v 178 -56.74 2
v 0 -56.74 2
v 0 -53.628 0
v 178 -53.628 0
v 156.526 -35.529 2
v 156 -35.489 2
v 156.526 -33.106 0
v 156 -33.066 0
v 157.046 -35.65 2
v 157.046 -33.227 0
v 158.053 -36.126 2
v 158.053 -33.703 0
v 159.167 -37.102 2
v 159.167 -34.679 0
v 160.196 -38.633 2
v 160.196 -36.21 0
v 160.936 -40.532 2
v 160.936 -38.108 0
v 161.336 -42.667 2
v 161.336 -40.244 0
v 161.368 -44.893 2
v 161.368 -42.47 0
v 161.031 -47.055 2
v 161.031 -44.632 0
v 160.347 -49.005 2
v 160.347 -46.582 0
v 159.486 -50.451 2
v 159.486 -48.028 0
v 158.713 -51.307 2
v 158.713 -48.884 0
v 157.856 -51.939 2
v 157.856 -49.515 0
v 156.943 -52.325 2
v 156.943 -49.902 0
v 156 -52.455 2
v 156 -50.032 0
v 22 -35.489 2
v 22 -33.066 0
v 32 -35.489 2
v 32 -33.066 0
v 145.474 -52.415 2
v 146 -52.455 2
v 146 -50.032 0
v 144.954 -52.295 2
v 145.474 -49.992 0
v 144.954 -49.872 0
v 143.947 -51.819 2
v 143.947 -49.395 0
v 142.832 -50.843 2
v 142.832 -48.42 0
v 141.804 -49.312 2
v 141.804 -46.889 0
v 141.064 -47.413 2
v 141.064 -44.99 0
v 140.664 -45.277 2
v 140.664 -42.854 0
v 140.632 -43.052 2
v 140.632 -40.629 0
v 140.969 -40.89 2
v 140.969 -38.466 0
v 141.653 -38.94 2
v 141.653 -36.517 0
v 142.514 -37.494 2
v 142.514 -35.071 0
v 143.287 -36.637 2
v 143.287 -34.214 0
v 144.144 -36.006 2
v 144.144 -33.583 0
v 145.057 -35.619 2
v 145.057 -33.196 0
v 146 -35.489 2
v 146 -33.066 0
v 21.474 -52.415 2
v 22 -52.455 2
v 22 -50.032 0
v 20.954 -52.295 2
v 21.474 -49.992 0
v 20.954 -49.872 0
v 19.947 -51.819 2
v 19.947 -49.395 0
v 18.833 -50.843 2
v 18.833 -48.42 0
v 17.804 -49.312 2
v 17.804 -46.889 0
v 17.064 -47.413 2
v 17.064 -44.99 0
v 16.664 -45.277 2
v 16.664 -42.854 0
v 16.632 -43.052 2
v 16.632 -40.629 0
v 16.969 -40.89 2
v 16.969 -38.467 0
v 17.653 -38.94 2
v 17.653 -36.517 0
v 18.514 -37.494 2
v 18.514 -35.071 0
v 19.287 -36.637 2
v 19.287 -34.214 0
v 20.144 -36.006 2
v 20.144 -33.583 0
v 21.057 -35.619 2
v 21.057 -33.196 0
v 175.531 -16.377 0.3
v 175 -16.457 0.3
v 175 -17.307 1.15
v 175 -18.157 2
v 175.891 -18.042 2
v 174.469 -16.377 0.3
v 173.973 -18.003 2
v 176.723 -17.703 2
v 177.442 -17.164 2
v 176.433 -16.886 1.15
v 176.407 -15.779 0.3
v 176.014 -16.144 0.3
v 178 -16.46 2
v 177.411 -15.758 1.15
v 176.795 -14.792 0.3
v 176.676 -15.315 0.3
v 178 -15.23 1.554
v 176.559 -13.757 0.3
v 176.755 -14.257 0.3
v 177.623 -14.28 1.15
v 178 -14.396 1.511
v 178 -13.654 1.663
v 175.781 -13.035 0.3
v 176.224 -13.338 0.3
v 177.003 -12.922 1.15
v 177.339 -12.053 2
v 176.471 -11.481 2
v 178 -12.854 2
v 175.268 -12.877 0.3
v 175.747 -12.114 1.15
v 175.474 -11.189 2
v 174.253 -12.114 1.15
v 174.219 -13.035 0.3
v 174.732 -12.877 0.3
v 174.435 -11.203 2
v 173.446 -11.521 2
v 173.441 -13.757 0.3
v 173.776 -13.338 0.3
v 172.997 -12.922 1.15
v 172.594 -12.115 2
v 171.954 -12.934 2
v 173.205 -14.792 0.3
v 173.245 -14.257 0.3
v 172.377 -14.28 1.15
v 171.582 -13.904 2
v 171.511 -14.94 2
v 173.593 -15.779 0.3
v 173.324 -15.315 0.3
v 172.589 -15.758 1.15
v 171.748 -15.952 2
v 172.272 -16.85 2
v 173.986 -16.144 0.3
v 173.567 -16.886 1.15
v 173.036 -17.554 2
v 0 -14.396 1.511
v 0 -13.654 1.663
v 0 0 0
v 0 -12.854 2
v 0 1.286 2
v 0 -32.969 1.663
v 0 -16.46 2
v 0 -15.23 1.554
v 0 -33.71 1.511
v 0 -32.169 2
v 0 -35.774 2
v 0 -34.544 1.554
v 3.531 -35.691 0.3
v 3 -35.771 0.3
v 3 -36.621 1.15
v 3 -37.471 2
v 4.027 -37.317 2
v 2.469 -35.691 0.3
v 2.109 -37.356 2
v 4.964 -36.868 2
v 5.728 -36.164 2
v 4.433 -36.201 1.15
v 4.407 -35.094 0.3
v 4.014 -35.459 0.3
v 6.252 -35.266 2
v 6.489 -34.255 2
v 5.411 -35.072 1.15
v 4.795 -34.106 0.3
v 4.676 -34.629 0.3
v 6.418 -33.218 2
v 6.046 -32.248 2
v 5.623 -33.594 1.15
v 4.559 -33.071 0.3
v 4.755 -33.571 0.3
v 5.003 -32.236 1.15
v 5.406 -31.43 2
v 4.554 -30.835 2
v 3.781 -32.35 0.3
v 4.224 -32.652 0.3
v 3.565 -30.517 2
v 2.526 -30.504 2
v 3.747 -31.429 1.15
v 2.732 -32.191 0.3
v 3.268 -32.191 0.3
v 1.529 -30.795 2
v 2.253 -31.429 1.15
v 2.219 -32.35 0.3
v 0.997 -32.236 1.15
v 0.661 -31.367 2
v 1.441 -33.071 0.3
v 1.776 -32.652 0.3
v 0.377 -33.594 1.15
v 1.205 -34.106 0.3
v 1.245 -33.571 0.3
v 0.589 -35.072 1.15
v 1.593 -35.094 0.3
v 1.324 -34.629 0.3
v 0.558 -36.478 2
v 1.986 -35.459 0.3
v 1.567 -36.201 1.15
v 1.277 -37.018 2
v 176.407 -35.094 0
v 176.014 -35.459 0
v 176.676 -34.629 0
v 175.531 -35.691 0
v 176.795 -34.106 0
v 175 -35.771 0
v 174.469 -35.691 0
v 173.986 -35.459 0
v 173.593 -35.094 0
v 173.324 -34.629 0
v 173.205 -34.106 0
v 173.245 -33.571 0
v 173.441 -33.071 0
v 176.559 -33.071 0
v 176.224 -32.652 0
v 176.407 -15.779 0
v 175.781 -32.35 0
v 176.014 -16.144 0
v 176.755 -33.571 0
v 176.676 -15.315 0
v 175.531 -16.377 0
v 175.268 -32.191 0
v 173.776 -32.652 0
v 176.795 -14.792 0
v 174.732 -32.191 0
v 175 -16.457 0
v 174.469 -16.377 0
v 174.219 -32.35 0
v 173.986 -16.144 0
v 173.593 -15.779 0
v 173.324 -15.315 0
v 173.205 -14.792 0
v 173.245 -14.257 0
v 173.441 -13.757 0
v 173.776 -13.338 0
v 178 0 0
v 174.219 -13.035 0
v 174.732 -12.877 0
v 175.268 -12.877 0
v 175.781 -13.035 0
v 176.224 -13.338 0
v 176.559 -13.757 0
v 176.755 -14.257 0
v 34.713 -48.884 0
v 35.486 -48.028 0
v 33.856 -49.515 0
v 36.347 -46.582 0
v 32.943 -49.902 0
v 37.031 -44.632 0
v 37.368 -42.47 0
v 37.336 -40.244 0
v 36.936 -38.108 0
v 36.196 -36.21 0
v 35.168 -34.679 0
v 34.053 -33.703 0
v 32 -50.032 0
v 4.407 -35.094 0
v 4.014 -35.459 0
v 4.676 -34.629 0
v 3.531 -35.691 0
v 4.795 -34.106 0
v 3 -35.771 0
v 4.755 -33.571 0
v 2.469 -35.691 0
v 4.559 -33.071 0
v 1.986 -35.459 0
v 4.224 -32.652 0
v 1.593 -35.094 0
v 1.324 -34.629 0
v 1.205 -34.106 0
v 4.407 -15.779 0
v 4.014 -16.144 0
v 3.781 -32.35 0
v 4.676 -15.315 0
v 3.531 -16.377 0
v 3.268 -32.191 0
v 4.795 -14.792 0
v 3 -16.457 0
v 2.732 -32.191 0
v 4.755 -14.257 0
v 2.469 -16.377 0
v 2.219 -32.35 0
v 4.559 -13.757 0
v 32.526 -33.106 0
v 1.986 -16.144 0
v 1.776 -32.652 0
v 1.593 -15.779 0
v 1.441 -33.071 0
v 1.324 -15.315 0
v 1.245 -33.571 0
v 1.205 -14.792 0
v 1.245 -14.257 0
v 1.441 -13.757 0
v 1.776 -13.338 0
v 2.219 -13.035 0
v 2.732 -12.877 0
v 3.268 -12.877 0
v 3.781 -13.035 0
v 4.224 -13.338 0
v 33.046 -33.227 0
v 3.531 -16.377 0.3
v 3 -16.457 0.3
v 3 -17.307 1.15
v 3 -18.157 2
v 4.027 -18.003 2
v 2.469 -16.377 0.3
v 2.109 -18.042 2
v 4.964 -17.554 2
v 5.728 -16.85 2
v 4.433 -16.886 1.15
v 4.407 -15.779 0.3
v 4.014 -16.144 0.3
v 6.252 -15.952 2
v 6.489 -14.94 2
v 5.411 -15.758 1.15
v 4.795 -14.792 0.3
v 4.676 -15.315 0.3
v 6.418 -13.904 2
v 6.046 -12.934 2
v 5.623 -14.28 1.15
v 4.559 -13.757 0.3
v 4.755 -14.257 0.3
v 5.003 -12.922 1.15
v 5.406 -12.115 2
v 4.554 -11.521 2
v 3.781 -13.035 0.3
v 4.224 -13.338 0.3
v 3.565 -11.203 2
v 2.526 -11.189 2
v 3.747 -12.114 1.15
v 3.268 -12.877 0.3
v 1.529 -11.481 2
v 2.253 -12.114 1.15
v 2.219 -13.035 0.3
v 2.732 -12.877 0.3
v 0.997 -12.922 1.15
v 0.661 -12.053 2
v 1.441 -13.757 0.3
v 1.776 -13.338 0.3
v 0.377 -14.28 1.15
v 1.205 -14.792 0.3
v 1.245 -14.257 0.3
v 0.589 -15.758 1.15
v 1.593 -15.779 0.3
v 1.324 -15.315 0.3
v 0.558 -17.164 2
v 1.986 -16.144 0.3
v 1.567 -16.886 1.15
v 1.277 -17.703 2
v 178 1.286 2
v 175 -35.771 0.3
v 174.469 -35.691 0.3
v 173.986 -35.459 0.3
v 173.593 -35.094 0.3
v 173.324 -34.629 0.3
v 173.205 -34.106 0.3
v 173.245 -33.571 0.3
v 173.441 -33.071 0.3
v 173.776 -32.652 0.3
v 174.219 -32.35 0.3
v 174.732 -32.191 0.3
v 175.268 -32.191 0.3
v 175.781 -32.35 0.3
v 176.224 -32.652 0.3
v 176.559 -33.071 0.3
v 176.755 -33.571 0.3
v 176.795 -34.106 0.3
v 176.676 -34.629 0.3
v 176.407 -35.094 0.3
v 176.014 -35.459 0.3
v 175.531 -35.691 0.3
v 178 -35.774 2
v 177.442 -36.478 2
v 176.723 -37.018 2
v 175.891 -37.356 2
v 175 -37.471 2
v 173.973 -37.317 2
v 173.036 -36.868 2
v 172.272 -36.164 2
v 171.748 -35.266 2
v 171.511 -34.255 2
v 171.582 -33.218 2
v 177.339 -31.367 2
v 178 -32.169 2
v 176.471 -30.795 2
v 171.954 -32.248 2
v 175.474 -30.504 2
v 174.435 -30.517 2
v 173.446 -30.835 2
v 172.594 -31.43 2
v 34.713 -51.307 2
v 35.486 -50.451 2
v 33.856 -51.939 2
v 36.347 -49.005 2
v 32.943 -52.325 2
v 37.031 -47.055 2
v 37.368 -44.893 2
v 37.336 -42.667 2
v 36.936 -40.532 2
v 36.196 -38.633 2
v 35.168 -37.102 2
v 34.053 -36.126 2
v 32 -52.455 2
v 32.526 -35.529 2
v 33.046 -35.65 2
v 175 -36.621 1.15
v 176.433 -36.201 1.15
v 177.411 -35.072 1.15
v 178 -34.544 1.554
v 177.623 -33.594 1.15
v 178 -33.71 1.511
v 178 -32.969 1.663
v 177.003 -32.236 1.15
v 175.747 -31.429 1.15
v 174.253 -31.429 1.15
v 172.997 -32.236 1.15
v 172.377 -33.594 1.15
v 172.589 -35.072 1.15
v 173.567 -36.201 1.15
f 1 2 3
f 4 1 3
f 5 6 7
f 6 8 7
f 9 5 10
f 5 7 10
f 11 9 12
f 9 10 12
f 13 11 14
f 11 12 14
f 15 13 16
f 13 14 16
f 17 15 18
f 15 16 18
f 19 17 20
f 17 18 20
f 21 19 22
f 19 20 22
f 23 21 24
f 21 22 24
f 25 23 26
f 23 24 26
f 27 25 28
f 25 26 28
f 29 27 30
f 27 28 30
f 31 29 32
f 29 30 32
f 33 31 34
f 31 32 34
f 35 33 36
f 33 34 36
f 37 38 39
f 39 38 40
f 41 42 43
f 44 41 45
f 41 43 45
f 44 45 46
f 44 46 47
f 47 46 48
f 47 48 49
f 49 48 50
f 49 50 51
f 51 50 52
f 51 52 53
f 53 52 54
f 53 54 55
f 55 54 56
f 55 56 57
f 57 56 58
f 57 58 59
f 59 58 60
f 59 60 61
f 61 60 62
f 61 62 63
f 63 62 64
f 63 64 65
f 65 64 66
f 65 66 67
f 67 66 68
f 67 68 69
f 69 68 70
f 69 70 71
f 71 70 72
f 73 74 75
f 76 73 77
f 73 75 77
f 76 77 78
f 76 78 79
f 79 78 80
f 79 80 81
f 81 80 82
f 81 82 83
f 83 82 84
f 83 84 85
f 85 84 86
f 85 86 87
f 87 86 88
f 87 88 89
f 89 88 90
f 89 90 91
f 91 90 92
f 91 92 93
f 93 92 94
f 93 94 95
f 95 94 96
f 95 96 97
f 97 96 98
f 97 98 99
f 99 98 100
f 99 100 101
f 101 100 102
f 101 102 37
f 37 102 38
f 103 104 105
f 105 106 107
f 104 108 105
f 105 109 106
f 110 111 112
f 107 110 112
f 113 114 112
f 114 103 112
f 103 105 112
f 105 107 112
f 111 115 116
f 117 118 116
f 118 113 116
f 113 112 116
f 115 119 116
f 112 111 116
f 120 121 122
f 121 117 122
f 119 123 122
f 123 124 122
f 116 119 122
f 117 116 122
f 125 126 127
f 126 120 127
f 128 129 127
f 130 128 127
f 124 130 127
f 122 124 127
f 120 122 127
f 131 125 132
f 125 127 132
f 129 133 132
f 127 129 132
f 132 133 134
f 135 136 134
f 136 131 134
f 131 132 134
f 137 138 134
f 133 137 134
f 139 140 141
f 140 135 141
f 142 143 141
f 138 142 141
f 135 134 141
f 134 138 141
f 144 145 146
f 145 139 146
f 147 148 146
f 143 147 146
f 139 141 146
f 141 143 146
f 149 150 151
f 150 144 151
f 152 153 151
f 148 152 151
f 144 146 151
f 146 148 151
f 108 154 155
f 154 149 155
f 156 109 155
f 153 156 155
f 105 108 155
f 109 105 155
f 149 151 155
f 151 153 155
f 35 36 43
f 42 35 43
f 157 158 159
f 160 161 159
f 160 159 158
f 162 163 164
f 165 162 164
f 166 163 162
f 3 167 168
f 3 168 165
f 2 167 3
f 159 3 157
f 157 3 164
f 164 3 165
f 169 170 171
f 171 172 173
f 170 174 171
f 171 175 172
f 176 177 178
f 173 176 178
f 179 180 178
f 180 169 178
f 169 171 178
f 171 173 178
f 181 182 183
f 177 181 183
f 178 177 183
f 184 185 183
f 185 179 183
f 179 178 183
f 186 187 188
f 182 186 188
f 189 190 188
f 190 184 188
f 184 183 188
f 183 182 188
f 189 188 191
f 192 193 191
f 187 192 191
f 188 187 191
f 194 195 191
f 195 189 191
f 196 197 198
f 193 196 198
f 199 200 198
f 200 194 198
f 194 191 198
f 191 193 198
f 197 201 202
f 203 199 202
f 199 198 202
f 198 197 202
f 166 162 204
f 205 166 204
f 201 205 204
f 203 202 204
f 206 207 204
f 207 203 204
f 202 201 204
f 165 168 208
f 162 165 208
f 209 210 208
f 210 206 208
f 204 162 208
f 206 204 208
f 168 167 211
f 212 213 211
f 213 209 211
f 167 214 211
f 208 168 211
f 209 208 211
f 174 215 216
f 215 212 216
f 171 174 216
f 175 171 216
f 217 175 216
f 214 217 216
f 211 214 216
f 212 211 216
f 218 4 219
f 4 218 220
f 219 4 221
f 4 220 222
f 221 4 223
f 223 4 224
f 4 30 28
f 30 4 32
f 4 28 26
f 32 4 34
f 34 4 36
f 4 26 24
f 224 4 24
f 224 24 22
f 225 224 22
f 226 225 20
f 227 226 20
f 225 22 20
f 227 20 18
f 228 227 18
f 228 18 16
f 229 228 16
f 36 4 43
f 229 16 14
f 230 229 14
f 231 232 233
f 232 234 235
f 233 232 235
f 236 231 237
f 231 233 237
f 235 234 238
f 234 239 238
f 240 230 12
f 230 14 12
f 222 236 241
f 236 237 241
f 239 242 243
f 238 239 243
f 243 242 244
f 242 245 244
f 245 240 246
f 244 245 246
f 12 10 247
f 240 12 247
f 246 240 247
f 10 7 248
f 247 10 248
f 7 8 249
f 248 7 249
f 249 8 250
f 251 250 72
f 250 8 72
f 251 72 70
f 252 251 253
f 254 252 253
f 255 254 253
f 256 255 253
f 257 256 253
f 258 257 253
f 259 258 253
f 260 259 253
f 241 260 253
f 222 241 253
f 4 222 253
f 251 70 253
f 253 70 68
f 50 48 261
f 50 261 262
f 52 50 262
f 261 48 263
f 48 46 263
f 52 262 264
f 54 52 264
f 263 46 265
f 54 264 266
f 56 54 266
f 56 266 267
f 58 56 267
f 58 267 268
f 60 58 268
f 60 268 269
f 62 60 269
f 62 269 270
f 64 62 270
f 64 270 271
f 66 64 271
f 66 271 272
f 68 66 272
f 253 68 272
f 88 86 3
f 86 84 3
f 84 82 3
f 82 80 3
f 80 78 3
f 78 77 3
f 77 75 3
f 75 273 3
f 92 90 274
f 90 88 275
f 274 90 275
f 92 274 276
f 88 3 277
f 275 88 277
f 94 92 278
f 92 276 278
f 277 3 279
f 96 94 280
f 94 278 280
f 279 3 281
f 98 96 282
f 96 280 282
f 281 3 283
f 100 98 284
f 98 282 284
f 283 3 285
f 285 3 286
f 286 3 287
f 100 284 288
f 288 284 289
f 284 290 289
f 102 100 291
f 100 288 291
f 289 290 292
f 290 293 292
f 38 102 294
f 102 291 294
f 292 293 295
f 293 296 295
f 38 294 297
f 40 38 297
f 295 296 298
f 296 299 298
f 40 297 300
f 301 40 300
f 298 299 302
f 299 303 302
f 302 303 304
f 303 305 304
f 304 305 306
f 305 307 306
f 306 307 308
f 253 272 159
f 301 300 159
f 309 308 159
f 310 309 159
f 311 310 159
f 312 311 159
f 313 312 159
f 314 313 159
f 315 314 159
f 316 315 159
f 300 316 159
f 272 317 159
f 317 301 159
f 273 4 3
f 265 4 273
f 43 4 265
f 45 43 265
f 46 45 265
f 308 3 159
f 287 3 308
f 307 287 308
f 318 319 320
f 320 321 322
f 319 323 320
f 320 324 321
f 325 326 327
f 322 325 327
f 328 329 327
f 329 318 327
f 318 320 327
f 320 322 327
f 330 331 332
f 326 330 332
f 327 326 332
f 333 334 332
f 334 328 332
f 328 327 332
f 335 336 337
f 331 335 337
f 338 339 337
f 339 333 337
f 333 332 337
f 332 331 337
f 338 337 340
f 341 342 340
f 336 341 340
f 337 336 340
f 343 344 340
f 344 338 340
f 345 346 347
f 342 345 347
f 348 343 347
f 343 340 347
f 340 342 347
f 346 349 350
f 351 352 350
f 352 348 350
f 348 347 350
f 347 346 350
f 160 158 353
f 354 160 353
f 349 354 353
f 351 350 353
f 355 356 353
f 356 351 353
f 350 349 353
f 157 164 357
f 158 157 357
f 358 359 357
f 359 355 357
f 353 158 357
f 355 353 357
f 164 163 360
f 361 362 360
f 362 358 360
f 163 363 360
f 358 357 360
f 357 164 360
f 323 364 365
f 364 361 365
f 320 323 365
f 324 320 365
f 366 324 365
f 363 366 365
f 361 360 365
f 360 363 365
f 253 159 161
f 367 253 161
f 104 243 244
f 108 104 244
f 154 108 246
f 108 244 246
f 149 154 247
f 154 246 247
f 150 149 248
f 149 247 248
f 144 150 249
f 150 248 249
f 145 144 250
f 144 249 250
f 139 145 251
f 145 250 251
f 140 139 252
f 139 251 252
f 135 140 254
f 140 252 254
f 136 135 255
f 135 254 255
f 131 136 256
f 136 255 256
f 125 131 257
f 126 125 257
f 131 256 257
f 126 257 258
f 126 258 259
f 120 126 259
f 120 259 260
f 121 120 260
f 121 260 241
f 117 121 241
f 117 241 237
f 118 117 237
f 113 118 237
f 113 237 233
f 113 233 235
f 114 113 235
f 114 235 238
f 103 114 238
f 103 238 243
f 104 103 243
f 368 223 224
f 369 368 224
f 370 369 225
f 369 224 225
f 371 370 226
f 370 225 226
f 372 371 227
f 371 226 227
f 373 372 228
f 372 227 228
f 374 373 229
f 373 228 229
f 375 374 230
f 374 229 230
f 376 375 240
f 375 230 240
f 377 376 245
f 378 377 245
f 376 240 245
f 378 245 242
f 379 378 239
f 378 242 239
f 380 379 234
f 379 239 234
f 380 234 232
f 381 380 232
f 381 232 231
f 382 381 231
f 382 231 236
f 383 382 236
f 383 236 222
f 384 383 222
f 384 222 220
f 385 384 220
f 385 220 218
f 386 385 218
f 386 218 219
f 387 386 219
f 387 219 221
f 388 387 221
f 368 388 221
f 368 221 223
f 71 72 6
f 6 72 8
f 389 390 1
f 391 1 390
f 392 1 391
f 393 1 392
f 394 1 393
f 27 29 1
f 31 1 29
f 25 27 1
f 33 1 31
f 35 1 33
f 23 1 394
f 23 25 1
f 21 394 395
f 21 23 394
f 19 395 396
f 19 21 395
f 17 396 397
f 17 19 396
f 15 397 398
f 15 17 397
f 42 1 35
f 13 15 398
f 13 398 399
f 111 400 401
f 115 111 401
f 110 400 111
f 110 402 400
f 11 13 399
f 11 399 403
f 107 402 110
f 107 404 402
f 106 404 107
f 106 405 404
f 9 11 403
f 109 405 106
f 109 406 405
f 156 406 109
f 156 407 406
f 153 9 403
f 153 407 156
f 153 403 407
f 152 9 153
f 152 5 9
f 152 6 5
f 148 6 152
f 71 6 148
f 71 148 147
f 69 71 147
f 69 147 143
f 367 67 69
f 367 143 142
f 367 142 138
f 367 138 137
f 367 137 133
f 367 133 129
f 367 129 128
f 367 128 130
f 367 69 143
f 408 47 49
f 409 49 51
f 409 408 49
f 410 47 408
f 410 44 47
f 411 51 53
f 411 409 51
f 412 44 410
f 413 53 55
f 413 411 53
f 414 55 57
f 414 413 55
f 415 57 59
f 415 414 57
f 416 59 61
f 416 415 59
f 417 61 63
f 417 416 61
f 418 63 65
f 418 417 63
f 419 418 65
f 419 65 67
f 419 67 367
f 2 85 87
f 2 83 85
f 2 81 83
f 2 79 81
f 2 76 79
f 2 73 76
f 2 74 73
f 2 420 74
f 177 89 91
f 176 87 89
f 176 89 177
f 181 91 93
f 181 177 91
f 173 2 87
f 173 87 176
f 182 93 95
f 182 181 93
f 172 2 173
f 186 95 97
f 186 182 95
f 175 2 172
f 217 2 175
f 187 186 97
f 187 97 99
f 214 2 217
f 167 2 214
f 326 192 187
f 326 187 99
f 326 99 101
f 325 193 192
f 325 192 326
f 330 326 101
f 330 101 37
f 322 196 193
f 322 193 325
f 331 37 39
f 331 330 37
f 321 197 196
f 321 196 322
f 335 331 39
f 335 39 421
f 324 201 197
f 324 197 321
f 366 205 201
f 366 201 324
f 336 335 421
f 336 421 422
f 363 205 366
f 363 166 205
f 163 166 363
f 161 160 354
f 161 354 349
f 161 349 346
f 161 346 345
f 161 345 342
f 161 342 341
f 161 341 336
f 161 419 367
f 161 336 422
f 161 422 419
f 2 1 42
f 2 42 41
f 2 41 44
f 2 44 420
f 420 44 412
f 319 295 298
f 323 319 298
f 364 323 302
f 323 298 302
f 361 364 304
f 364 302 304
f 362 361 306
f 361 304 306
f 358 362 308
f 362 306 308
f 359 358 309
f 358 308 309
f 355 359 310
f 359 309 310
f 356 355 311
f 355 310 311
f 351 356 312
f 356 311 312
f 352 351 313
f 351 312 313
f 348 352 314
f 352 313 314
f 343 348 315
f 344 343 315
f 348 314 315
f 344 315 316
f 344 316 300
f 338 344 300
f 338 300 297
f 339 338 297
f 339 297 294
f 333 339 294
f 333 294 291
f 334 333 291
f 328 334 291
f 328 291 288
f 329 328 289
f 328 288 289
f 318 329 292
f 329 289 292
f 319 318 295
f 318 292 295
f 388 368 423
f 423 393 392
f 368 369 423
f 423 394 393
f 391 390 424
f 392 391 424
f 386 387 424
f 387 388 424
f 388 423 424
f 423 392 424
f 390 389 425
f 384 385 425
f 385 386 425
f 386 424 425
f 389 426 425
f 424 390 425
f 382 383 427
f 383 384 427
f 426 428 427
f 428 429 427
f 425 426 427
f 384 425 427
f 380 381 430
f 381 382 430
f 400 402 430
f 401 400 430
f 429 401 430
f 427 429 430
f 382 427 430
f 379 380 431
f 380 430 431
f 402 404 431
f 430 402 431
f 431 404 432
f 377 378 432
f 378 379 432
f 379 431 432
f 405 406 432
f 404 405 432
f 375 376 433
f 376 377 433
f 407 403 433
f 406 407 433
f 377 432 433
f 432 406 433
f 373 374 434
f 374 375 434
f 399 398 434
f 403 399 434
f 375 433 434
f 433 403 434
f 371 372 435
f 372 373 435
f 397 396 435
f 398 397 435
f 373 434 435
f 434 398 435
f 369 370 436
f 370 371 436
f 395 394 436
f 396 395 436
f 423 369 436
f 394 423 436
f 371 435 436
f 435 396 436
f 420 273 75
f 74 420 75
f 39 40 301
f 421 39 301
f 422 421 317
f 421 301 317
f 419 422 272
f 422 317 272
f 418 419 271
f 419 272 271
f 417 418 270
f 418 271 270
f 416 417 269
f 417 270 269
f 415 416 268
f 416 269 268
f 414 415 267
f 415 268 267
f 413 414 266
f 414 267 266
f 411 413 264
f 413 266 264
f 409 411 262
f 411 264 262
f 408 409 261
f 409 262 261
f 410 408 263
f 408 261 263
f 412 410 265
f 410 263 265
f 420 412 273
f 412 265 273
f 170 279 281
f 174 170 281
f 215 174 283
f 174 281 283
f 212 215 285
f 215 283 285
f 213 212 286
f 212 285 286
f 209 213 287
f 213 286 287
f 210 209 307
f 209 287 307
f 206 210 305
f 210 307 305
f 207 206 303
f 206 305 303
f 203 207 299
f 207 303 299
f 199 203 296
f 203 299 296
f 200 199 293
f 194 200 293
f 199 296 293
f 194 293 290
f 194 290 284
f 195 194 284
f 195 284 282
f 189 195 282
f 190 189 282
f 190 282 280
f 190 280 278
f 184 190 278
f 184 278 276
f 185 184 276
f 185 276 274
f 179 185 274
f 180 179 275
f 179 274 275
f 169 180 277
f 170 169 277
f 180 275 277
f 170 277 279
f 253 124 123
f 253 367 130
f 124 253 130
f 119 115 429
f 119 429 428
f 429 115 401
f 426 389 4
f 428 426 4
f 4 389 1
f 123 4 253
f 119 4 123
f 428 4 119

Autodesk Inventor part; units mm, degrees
ref_plane "YZ Plane" through (0, 0, 0) normal (1, 0, 0) x (0, 1, 0)
ref_plane "XZ Plane" through (0, 0, 0) normal (0, 1, 0) x (-1, 0, 0)
ref_plane "Work Plane1" through (0, 4.7283, -22.9522) normal (-1, 0, 0) x (0, -0.8411785, 0.5407576)
sketch "Sketch1" plane through (0, 4.7283, -22.9522) normal (-1, 0, 0) x (0, -0.8411785, 0.5407576)
  line L0 (-61.5, -16.75) -> (-59.949, -16.75) projected
  line L1 (61.5, -12.25) -> (61.5, -16.75) projected
  line L2 (61.5, -16.75) -> (65.5, -16.75) projected
  line L3 (65.5, -16.75) -> (65.5, -20.25) projected
  line L4 (65.5, -20.25) -> (79.5, -20.25) projected
  line L5 (79.5, -20.25) -> (65.5, -11.25) projected
  line L6 (65.5, -11.25) -> (65.5, -12.25) projected
  line L7 (65.5, -12.25) -> (61.5, -12.25) projected
  line L8 (16.3889, 16.75) -> (16.3889, 18.75) projected
  line L9 (14.3494, 18.75) -> (16.3889, 18.75) projected
  line L10 (65.1985, -12.25) -> (12.6206, 21.5501)
  line L11 (16.3889, 16.75) -> (16.3889, 19.1276)
  arc A0 (-61.5, -15.199) -> (-59.949, -16.75) centre (-58.75, -14) ccw projected
  line L12 (-61.5, -15.199) -> (-61.5, -16.75) projected
  arc A1 (-57.551, -16.75) -> (-61.5, -12.801) centre (-58.75, -14) ccw projected
  line L13 (-57.551, -16.75) -> (-36.699, -16.75) projected
  arc A2 (-34.301, -16.75) -> (-36.699, -16.75) centre (-35.5, -14) ccw projected
  line L14 (-34.301, -16.75) -> (61.5, -16.75) projected
  line L15 (61.5, -16.75) -> (61.5, -12.25) projected
  line L16 (61.5, -12.25) -> (16.3889, 16.75) projected
  line L17 (16.3889, 16.75) -> (-61.5, 16.75) projected
  line L18 (-61.5, 16.75) -> (-61.5, -12.801) projected
  dimension "d14" = 2
ref_plane "Work Plane2" through (178, -56.0619, -70.2985) normal (1, 0, 0) x (0, 0.8411785, -0.5407576)
extrude "Extrusion1" add sketch "Sketch1" against normal up to surface (178 mm away) contours L16 L8 L11 L10 L7
sketch "Sketch2" plane through (0, -56.7396, 2) normal (0, 0, 1) x (1, 0, 0)
  circle A0 centre (3, 22.7682) radius 2.5 projected
  circle A1 centre (3, 42.0825) radius 2.5 projected
  line L0 (0, 3.1111) -> (0, 56.7396) projected
  line L1 (0, 3.1111) -> (6, 3.1111) projected
  line L2 (6, 56.7396) -> (6, 3.1111) projected
  line L3 (0, 56.7396) -> (6, 56.7396) projected
  circle A2 centre (175, 22.7682) radius 2.5 projected
  circle A3 centre (175, 42.0825) radius 2.5 projected
  line L4 (178, 3.1111) -> (178, 56.7396) projected
  line L5 (178, 56.7396) -> (172, 56.7396) projected
  line L6 (172, 56.7396) -> (172, 3.1111) projected
  line L7 (178, 3.1111) -> (172, 3.1111) projected
hole "Hole1" at (3, -14.6571, 2) at (3, -33.9713, 2) at (175, -33.9713, 2) at (175, -14.6571, 2) direction (0, 0, -1) diameter 3.6 end through all countersink diameter 7 countersink angle 90 clearance for "Countersunk Flat Head Screw ISO 2009/7046" size "M3" standard "ISO"
ref_plane "Work Plane3" through (22, -30.5397, -9.0869) normal (0, -0.7712334, 0.6365525) x (1, 0, 0)
sketch "Sketch3" plane through (22, -30.5397, -9.0869) normal (0, -0.7712334, 0.6365525) x (1, 0, 0)
  line L0 (-9.9215, 5.4518) -> (-9.9215, -5.4534)
  spline S0 degree 3 poles (-9.9215, -5.4534) (-9.9222, -5.5772) (-9.8204, -5.8209) (-9.5772, -5.9222) (-9.4534, -5.9215) knots 0 0 0 0 0.5 1 1 1 1
  line L1 (-9.4534, -5.9215) -> (19.4534, -5.9215)
  spline S1 degree 3 poles (19.4534, -5.9215) (19.5775, -5.9222) (19.8219, -5.82) (19.9222, -5.5758) (19.9215, -5.4518) knots 0 0 0 0 0.5 1 1 1 1
  line L2 (19.9215, -5.4518) -> (19.9215, 5.4534)
  spline S2 degree 3 poles (19.9215, 5.4534) (19.9222, 5.5775) (19.82, 5.8219) (19.5758, 5.9222) (19.4518, 5.9215) knots 0 0 0 0 0.5 1 1 1 1
  line L3 (19.4518, 5.9215) -> (-9.4534, 5.9215)
  spline S3 degree 3 poles (-9.4534, 5.9215) (-9.5775, 5.9222) (-9.8219, 5.82) (-9.9222, 5.5758) (-9.9215, 5.4518) knots 0 0 0 0 0.5 1 1 1 1
  circle A0 centre (-8.3791, -4.3791) radius 0.5
  circle A1 centre (-8.3791, 4.3791) radius 0.5
  circle A2 centre (18.3791, 4.3791) radius 0.5
  circle A3 centre (18.3791, -4.3791) radius 0.5
  arc A4 (5.2617, -1.4512) -> (5.1811, -1.5218) centre (5.2771, -1.55) ccw
  arc A5 (5.1811, 1.5218) -> (5.1811, -1.5218) centre (0, 0) ccw
  arc A6 (5.1811, 1.5218) -> (5.2617, 1.4512) centre (5.2771, 1.55) ccw
  arc A7 (5.2617, 1.4512) -> (5.3414, 1.519) centre (5.2463, 1.55) ccw
  arc A8 (5.3414, -1.519) -> (5.3414, 1.519) centre (10, 0) ccw
  arc A9 (5.3414, -1.519) -> (5.2617, -1.4512) centre (5.2463, -1.55) ccw
  line L4 (143.9215, 5.4518) -> (143.9215, -5.4534)
  spline S4 degree 3 poles (143.4534, 5.9215) (143.5775, 5.9222) (143.8219, 5.82) (143.9222, 5.5758) (143.9215, 5.4518) knots 0 0 0 0 0.5 1 1 1 1
  line L5 (114.5482, 5.9215) -> (143.4534, 5.9215)
  spline S5 degree 3 poles (114.0785, 5.4534) (114.0778, 5.5775) (114.18, 5.8219) (114.4242, 5.9222) (114.5482, 5.9215) knots 0 0 0 0 0.5 1 1 1 1
  line L6 (114.0785, -5.4518) -> (114.0785, 5.4534)
  spline S6 degree 3 poles (114.5466, -5.9215) (114.4225, -5.9222) (114.1781, -5.82) (114.0778, -5.5758) (114.0785, -5.4518) knots 0 0 0 0 0.5 1 1 1 1
  line L7 (143.4534, -5.9215) -> (114.5466, -5.9215)
  spline S7 degree 3 poles (143.9215, -5.4534) (143.9222, -5.5772) (143.8204, -5.8209) (143.5772, -5.9222) (143.4534, -5.9215) knots 0 0 0 0 0.5 1 1 1 1
  circle A10 centre (142.3791, -4.3791) radius 0.5
  circle A11 centre (142.3791, 4.3791) radius 0.5
  circle A12 centre (115.6209, 4.3791) radius 0.5
  circle A13 centre (115.6209, -4.3791) radius 0.5
  arc A14 (128.8189, -1.5218) -> (128.7383, -1.4512) centre (128.7229, -1.55) ccw
  arc A15 (128.7383, -1.4512) -> (128.6586, -1.519) centre (128.7537, -1.55) ccw
  arc A16 (128.6586, 1.519) -> (128.6586, -1.519) centre (124, 0) ccw
  arc A17 (128.6586, 1.519) -> (128.7383, 1.4512) centre (128.7537, 1.55) ccw
  arc A18 (128.7383, 1.4512) -> (128.8189, 1.5218) centre (128.7229, 1.55) ccw
  arc A19 (128.8189, -1.5218) -> (128.8189, 1.5218) centre (134, 0) ccw
  circle A20 centre (10, 0) radius 5.4
  circle A21 centre (124, 0) radius 5.4
  line L8 (0, 5.4) -> (10, 5.4)
  line L9 (10, -5.4) -> (0, -5.4)
  line L10 (124, 5.4) -> (134, 5.4)
  line L11 (134, -5.4) -> (124, -5.4)
  point P0 (-22, 26.4483)
  dimension "d9" = 10.8
  dimension "d10" = 10.8
extrude "Extrusion2" cut sketch "Sketch3" along normal blind 78.25 contours A9 A8 A7 A6 A5 A20 A4 | A4 A5 A20 A6 A7 A8 A9 | A20 L9 A5 | A5 A20 | A5 L8 A20 | A19 A21 A18 A17 A16 A15 A14 | A14 A15 A16 A17 A18 A19 A21 | A21 A19 | A19 L11 A21 | A19 A21 L10
properties part number "front"
